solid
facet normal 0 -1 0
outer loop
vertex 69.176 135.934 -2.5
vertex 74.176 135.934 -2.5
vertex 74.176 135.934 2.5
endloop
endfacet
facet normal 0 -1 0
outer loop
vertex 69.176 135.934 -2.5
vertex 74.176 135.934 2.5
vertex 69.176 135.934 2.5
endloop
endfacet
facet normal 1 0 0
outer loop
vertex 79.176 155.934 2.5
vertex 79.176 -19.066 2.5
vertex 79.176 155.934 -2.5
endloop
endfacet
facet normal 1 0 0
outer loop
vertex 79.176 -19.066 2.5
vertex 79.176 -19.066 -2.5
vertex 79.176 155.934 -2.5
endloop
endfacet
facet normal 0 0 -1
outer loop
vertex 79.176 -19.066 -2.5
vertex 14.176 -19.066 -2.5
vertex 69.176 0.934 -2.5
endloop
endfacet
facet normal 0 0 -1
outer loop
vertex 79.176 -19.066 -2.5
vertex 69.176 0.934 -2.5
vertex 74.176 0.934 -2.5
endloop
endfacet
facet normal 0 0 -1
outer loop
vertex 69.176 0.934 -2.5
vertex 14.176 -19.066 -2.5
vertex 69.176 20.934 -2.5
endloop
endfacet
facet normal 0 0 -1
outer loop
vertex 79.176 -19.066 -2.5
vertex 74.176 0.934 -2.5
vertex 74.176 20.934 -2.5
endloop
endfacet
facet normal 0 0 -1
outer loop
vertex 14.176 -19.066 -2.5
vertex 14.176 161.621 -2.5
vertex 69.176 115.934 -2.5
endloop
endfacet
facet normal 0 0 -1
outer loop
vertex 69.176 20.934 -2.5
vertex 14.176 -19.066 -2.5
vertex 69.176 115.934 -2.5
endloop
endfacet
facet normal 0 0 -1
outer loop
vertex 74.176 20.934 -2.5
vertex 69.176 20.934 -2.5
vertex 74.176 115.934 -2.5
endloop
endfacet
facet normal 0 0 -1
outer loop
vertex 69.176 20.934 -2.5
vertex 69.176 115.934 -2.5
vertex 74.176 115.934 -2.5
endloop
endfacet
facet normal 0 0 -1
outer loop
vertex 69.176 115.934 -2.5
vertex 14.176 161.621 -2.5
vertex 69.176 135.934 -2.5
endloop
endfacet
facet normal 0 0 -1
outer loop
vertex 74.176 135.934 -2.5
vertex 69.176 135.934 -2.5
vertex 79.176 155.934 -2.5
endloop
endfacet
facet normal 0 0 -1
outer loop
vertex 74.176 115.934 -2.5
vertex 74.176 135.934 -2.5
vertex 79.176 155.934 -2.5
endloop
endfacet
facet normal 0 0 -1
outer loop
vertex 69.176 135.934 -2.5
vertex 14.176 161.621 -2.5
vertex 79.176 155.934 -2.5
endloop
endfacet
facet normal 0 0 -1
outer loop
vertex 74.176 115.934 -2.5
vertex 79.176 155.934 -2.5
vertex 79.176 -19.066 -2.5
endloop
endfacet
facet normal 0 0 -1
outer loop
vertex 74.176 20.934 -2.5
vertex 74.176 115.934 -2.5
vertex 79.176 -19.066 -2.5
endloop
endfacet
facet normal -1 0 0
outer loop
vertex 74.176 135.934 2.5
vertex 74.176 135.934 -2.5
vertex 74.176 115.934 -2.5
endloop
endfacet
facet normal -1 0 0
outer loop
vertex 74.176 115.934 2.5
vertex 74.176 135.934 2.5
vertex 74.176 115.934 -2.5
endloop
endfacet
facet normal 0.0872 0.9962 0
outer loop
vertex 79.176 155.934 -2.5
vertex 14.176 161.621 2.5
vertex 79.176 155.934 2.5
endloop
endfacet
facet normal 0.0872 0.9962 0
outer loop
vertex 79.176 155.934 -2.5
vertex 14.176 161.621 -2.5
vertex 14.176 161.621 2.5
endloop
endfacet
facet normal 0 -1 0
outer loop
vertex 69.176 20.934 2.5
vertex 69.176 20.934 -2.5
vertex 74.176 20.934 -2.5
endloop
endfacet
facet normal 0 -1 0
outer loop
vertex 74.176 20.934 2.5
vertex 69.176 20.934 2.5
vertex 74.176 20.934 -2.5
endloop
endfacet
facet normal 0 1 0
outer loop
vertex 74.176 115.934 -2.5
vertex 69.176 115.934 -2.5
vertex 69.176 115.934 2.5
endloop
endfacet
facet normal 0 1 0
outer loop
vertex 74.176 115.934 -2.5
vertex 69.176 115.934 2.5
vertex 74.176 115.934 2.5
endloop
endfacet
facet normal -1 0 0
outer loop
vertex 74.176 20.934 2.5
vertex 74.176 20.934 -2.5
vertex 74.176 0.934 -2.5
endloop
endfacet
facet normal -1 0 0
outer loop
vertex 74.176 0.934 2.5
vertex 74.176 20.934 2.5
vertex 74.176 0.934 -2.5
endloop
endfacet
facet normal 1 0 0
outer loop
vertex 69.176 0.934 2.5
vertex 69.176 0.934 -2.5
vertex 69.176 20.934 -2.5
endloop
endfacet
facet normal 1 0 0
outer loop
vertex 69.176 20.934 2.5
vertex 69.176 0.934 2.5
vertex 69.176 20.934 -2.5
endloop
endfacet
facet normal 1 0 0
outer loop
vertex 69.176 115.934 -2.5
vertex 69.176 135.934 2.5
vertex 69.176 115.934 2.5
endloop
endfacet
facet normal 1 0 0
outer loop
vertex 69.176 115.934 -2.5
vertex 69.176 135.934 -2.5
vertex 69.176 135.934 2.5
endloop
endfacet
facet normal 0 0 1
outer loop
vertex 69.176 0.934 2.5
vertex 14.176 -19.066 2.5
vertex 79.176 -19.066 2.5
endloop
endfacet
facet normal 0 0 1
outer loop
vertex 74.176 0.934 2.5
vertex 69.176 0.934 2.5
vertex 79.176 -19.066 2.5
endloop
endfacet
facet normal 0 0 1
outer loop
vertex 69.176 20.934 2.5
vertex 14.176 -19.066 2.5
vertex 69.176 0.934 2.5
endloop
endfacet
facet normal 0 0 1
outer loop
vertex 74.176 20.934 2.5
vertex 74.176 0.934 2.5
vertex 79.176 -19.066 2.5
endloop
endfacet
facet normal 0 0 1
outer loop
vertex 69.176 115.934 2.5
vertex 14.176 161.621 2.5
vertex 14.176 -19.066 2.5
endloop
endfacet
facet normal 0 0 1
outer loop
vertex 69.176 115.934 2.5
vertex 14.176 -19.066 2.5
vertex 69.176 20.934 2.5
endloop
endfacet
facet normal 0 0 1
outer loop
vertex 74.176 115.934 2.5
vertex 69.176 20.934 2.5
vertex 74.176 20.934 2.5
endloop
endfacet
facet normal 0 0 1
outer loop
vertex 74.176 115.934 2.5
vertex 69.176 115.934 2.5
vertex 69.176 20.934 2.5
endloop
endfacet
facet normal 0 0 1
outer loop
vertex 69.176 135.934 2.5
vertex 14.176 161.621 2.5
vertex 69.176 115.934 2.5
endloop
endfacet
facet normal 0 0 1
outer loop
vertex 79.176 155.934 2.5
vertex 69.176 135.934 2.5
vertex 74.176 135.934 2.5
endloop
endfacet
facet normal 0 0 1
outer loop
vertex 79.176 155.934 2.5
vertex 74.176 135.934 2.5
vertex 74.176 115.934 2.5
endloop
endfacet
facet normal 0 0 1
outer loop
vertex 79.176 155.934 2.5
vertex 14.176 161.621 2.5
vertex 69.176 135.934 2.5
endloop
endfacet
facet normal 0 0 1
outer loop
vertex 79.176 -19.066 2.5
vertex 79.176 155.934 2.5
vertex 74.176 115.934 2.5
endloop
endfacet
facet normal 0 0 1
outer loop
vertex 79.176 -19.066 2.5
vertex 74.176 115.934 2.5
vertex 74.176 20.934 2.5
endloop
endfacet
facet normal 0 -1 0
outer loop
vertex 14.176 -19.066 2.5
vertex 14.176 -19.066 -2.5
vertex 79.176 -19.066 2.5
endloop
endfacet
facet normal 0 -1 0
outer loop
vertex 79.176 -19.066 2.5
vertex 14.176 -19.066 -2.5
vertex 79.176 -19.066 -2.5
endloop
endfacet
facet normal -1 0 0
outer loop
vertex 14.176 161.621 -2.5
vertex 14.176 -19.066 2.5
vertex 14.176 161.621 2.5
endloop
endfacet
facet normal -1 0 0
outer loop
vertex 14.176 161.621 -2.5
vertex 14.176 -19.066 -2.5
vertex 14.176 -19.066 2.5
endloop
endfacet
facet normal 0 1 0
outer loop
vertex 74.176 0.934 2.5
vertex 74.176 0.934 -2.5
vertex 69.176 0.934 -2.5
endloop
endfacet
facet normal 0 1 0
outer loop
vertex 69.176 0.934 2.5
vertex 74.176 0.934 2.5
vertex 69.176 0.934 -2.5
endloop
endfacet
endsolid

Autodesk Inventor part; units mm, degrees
ref_plane "YZ Plane" through (0, 0, 0) normal (1, 0, 0) x (0, 1, 0)
ref_plane "XZ Plane" through (0, 0, 0) normal (0, 1, 0) x (-1, 0, 0)
ref_plane "XY Plane" through (0, 0, 0) normal (0, 0, 1) x (1, 0, 0)
sketch "Sketch1" plane through (0, 0, 0) normal (0, 0, 1) x (1, 0, 0)
  line L0 (14.1765, -19.066) -> (14.1765, 161.6208)
  line L1 (14.1765, -19.066) -> (79.1765, -19.066)
  line L2 (79.1765, -19.066) -> (79.1765, 155.934)
  line L3 (79.1765, -19.066) -> (14.1765, -19.066)
  line L4 (79.1765, -19.066) -> (14.1765, -19.066)
  line L5 (14.1765, 161.6208) -> (79.1765, 155.934)
  line L6 (79.1765, 135.934) -> (74.1765, 135.934)
  line L7 (74.1765, 135.934) -> (74.1765, 115.934)
  line L8 (74.1765, 115.934) -> (79.1765, 115.934)
  line L9 (79.1765, 115.934) -> (79.1765, 135.934)
  line L10 (69.1765, 20.934) -> (74.1765, 20.934)
  line L11 (74.1765, 20.934) -> (74.1765, 0.934)
  line L12 (74.1765, 0.934) -> (69.1765, 0.934)
  line L13 (69.1765, 0.934) -> (69.1765, 20.934)
  line L14 (74.1765, 135.934) -> (69.1765, 135.934)
  line L15 (69.1765, 135.934) -> (69.1765, 115.934)
  line L16 (69.1765, 115.934) -> (74.1765, 115.934)
  line L17 (74.1765, 115.934) -> (74.1765, 135.934)
  point P0 (0, 0)
  point P1 (71.6765, 0.934)
  point P2 (79.2985, 0.69)
  point P3 (79.2985, 20.69)
  point P4 (79.1765, 115.934)
  dimension "d3" = 65
  dimension "d23" = 85
  dimension "d26" = 175
  dimension "d27" = 180.6868
  dimension "d28" = 5
  dimension "d29" = 20
  dimension "d30" = 5
  dimension "d31" = 20
  dimension "d32" = 20
  dimension "d33" = 20
  dimension "d35" = 5
  dimension "d36" = 5
extrude "Extrusion1" add sketch "Sketch1" along normal mid plane 5 contours L0 L5 L2 L6 L14 L15 L16 L8 L1 | L8 L7 L6 L2
equation "\"BendRadius\" = Thickness"
equation "\"BendReliefWidth\" = Thickness"
equation "\"BendReliefDepth\" = 0.5 * Thickness"
equation "\"CornerReliefSize\" = 4 * Thickness"
equation "\"MinimumRemnant\" = 2 * Thickness"
equation "\"TransitionRadius\" = BendRadius"
equation "\"JacobiRadiusSize\" = BendRadius"
equation "\"GapSize\" = Thickness"
equation "\"Thickness\" = 0.5"
properties part number "stand"
